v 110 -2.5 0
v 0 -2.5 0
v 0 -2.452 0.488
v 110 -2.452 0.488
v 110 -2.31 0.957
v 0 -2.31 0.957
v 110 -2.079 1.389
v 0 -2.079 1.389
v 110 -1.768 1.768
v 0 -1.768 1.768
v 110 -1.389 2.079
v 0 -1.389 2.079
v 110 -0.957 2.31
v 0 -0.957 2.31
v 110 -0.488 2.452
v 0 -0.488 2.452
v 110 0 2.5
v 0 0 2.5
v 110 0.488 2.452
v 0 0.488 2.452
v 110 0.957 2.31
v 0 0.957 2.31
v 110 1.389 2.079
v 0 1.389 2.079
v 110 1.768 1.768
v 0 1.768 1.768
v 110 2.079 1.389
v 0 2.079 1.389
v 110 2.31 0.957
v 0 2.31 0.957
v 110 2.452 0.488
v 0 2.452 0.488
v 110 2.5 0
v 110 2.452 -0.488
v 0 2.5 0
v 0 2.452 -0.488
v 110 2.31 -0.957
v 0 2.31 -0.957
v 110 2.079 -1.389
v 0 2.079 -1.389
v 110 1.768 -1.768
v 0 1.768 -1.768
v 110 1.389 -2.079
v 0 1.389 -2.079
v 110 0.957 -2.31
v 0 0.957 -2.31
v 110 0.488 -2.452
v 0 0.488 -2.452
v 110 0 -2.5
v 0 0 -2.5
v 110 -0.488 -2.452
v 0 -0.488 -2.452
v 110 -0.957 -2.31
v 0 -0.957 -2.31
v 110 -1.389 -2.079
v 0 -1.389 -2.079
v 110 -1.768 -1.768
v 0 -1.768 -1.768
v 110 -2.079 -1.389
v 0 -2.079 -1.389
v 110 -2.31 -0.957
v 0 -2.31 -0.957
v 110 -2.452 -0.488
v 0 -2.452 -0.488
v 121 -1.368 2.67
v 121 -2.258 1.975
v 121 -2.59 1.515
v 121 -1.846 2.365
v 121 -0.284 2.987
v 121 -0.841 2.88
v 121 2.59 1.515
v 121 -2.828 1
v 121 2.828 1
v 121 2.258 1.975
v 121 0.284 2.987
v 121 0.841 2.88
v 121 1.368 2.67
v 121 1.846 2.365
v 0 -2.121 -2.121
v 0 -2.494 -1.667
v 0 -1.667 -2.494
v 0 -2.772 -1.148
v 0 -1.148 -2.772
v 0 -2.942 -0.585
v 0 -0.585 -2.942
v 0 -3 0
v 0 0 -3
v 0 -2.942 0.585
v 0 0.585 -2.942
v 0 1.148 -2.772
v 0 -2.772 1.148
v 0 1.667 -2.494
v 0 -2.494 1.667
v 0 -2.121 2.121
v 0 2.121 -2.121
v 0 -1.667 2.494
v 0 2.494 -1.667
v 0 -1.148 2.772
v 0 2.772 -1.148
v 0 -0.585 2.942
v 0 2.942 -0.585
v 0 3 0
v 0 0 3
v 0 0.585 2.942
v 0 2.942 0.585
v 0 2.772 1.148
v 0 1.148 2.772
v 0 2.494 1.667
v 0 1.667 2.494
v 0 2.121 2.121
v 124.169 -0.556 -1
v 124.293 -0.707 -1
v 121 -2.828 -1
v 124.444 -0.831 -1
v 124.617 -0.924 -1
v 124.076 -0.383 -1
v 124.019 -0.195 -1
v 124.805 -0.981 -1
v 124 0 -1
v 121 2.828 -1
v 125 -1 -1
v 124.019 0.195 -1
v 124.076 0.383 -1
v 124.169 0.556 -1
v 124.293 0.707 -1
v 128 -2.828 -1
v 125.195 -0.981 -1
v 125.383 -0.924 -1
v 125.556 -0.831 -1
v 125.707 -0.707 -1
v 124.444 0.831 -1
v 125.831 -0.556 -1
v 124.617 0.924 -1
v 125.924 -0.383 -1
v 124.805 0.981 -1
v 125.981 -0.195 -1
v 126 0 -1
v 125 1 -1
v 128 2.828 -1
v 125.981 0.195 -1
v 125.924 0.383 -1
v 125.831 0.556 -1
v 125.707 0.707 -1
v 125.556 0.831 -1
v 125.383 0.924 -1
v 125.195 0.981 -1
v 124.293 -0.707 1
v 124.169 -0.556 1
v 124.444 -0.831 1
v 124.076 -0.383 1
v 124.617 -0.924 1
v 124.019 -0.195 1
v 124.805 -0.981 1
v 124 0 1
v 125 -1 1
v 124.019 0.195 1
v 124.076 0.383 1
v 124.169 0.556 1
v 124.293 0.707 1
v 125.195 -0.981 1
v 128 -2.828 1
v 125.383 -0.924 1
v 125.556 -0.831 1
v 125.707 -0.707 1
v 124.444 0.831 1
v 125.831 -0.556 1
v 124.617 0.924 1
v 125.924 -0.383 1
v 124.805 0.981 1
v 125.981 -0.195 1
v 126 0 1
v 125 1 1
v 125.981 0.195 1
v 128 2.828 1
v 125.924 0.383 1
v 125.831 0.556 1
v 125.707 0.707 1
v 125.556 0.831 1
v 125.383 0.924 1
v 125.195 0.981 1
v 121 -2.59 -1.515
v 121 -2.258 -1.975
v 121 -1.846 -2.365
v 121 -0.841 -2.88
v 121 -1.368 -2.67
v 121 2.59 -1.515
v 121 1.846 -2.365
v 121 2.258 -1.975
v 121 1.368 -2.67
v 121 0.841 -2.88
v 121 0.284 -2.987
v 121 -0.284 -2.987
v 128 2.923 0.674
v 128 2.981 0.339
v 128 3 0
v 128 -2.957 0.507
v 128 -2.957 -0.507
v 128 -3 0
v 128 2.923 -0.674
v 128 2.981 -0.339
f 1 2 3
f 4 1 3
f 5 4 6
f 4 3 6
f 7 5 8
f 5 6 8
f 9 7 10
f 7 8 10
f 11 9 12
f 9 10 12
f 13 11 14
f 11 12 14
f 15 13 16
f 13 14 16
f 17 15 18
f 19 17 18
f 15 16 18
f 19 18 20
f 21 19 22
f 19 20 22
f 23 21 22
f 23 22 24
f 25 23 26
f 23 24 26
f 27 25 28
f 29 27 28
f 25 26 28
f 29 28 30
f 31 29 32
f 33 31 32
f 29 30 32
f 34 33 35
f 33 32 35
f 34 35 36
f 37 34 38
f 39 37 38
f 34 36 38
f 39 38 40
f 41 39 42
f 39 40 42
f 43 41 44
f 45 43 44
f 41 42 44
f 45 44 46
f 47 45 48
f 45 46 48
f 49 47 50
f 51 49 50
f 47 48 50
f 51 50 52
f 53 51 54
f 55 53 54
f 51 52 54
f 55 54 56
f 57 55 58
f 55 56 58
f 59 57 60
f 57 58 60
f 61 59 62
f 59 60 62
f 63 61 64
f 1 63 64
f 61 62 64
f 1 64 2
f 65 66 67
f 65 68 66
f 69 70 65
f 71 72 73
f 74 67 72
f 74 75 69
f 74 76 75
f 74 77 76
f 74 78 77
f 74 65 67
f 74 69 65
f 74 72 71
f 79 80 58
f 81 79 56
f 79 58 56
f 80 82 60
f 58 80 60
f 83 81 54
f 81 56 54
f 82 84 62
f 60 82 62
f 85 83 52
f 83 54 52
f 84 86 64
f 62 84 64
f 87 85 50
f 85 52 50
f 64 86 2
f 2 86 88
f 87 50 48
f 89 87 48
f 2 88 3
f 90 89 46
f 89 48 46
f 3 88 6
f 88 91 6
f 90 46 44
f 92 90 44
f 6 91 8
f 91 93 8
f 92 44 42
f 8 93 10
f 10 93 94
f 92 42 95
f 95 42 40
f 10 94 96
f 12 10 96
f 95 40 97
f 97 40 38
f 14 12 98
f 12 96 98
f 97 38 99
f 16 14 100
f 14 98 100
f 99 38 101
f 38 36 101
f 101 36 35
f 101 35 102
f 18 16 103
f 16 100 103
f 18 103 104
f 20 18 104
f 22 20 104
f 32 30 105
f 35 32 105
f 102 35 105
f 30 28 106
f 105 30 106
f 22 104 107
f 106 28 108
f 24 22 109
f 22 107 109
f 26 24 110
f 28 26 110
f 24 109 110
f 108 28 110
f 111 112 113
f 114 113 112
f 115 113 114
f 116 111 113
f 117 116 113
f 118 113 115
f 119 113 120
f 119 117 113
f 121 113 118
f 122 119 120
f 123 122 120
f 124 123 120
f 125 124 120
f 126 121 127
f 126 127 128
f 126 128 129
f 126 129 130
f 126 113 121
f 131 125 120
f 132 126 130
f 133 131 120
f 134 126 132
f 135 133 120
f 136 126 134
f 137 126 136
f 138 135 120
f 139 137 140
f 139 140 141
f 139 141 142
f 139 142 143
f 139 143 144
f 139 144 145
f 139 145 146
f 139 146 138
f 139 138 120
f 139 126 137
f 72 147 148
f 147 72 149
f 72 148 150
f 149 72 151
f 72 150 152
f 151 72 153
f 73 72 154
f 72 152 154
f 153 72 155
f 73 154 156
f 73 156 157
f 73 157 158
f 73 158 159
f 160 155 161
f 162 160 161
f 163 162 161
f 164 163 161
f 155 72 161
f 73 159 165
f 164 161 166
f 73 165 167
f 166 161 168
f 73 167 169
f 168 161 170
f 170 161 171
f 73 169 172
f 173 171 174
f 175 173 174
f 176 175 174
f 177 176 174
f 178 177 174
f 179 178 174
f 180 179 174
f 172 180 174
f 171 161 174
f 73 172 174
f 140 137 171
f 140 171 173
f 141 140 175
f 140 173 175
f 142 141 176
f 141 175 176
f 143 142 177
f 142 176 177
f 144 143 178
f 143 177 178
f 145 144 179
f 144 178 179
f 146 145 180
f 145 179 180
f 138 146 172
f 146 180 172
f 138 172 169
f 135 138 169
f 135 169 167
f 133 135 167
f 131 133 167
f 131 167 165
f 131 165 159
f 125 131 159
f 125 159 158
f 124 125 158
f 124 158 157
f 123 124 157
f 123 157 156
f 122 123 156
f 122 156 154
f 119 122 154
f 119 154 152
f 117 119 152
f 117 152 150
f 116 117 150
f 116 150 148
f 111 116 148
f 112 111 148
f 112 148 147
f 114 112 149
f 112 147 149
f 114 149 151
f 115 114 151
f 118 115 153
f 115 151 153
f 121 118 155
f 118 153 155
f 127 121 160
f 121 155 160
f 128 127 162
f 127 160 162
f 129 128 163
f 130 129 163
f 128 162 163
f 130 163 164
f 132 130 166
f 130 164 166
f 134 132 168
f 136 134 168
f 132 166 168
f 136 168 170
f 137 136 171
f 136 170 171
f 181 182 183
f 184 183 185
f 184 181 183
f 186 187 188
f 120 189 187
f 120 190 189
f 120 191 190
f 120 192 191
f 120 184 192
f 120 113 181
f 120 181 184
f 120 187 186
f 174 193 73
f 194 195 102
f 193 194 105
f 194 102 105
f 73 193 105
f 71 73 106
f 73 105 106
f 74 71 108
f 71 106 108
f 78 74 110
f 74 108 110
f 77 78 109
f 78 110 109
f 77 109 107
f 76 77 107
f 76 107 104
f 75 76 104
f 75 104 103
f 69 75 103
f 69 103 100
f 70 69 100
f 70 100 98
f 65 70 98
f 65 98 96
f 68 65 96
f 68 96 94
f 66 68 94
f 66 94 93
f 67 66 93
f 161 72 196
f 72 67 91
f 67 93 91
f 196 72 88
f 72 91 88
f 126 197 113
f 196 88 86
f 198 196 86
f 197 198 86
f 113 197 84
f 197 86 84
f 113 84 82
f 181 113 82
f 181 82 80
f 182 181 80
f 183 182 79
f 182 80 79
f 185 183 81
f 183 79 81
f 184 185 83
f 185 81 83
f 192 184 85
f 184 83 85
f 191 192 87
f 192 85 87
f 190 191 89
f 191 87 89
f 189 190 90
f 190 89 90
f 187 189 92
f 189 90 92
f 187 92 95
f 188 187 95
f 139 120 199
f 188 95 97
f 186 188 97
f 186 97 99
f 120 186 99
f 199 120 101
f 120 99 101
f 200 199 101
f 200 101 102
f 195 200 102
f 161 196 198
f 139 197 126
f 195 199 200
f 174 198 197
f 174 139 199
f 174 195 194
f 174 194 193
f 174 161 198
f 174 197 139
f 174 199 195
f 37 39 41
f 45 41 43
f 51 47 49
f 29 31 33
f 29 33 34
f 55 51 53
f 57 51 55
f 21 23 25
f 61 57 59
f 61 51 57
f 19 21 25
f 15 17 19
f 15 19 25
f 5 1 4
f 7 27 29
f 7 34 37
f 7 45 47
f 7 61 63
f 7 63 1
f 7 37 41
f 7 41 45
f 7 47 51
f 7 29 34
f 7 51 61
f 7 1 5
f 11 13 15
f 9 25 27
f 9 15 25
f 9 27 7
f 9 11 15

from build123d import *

# Parameters (mm, degrees)
F0_R     = 3
F1_DEPTH = 128
F2_W     = 10
F2_H     = 3.727433
F3_DEPTH = 7
F4_W     = 10
F4_H     = 10
F5_DEPTH = 7
F6_R     = 1
F7_DEPTH = 10
F8_R     = 2.5
F9_DEPTH = 110


with BuildPart() as f1:
    # F0 (on Right) → F1 (new body)
    with BuildSketch(Plane.YZ):
        Circle(F0_R)
    extrude(amount=F1_DEPTH)

    # F2 (on face) → F3 (cut)
    with BuildSketch(Plane.YZ.offset(128)):
        with Locations((0, 2.863716)):
            Rectangle(F2_W, F2_H)
    extrude(amount=-F3_DEPTH, mode=Mode.SUBTRACT)

    # F4 (on face) → F5 (cut)
    with BuildSketch(Plane.YZ.offset(128)):
        with Locations((0, -6)):
            Rectangle(F4_W, F4_H)
    extrude(amount=-F5_DEPTH, mode=Mode.SUBTRACT)

    # F6 (on face) → F7 (cut)
    with BuildSketch(Plane.XY.offset(1)):
        with Locations((125, 0)):
            Circle(F6_R)
    extrude(amount=-F7_DEPTH, mode=Mode.SUBTRACT)

    # F8 (on face) → F9 (cut)
    with BuildSketch(Plane(origin=(0, 0, 0), x_dir=(0, -1, 0), z_dir=(-1, 0, 0))):
        Circle(F8_R)
    extrude(amount=-F9_DEPTH, mode=Mode.SUBTRACT)


solid = f1.part
